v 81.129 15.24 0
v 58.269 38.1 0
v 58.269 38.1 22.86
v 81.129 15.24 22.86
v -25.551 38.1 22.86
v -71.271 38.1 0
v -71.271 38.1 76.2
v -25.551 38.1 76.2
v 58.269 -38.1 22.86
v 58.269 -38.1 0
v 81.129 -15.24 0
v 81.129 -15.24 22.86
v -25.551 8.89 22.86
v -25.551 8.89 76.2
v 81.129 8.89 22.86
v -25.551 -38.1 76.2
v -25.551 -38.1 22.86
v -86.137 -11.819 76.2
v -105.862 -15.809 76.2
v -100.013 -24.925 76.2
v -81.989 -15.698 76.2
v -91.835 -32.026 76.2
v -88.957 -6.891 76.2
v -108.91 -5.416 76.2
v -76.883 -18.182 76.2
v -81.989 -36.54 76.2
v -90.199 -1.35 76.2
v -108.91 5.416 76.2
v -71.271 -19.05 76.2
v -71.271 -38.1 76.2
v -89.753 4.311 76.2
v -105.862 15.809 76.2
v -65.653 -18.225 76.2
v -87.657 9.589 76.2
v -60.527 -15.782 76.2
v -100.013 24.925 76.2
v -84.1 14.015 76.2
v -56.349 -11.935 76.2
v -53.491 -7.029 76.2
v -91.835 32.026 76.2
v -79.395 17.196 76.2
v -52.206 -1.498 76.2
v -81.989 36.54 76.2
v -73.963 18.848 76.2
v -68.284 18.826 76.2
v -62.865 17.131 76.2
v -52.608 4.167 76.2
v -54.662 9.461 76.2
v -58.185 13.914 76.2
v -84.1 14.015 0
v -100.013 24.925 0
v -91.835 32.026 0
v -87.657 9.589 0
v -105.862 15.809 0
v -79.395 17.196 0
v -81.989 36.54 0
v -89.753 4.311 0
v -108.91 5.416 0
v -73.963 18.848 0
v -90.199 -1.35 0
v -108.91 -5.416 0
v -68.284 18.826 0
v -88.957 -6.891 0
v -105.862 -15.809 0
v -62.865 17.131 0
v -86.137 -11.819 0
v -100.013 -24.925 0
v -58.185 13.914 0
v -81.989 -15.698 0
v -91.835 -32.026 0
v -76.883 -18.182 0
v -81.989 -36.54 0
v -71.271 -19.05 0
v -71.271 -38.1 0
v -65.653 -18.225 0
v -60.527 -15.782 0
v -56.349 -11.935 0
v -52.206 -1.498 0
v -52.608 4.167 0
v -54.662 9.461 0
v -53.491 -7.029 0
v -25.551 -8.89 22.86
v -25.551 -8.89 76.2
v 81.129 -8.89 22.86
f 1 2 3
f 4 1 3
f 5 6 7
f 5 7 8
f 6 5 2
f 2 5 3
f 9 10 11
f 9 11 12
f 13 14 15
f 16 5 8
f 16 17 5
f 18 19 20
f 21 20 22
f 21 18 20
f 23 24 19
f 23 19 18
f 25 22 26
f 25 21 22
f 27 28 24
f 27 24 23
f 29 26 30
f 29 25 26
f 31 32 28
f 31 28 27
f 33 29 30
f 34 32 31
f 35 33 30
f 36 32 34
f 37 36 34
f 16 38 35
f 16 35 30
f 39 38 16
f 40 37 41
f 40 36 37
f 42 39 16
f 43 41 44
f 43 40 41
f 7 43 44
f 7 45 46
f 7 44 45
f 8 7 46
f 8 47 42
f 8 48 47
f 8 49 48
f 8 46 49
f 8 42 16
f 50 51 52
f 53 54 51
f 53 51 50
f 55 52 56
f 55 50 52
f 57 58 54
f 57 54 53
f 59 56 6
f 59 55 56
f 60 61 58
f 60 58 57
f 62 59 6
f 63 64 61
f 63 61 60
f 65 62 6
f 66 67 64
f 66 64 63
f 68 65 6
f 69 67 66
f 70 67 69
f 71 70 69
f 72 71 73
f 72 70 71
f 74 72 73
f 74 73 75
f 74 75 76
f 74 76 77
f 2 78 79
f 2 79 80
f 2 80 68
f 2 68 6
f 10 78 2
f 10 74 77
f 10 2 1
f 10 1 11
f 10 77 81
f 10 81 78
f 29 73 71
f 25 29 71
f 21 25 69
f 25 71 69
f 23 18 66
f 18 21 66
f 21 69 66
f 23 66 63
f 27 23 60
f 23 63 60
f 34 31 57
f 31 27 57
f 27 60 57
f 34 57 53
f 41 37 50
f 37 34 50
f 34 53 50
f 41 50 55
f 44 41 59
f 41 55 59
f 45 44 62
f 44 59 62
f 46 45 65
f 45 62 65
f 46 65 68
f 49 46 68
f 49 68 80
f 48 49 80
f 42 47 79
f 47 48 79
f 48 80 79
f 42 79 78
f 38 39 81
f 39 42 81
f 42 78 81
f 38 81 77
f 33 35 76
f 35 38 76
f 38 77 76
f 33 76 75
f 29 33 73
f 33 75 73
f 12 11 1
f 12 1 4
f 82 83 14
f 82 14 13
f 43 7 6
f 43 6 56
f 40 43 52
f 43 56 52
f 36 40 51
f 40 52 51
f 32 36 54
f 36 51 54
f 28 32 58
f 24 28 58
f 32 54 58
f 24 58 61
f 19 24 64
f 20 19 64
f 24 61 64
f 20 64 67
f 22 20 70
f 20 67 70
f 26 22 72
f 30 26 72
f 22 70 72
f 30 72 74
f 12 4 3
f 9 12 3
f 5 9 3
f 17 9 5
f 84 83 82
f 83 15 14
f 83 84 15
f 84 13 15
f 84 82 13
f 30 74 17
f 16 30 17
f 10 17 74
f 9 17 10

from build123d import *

# Parameters (mm, degrees)
F1_DEPTH = 38.1
F2_DEPTH = 8.89
F3_SIZE  = 22.86
F5_DEPTH = 76.2
F6_D     = 38.1


with BuildPart() as f1:
    # F0 (on Front) → F1 (new body, symmetric)
    with BuildSketch(Plane.XZ):
        Polygon((-71.271137, 76.2), (-71.271137, 0), (58.268863, 0), (81.128863, 0), (81.128863, 22.86), (-25.551137, 22.86), (-25.551137, 76.2), align=None)
    extrude(amount=F1_DEPTH, both=True)

    # F3
    f3_edges = [f1.edges().sort_by_distance(p)[0] for p in [
        (81.128863, -38.1, 11.43),
        (81.128863, 38.1, 11.43),
    ]]
    chamfer(f3_edges, length=F3_SIZE)

    # F4 (on Top) → F5 (join)
    with BuildSketch(Plane.XY):
        with BuildLine():
            ThreePointArc((-71.196891, -19.05), (-90.246891, 0), (-71.196891, 19.05))
            Line((-71.196891, 19.05), (-71.196891, 38.1))
            ThreePointArc((-71.196891, 38.1), (-109.296891, 0), (-71.196891, -38.1))
            Line((-71.196891, -38.1), (-71.196891, -19.05))
        make_face()
    extrude(amount=F5_DEPTH)

    # F6 (through all)
    with Locations(Plane(origin=(0, 0, 0), x_dir=(1, 0, 0), z_dir=(0, 0, -1))):
        with Locations((-71.196891, 0)):
            Hole(F6_D / 2)


with BuildPart() as f2:
    # F0 (on Front) → F2 (new body, symmetric)
    with BuildSketch(Plane.XZ):
        Polygon((81.128863, 22.86), (-25.551137, 76.2), (-25.551137, 22.86), align=None)
    extrude(amount=F2_DEPTH, both=True)


solid = Compound([f1.part, f2.part])
